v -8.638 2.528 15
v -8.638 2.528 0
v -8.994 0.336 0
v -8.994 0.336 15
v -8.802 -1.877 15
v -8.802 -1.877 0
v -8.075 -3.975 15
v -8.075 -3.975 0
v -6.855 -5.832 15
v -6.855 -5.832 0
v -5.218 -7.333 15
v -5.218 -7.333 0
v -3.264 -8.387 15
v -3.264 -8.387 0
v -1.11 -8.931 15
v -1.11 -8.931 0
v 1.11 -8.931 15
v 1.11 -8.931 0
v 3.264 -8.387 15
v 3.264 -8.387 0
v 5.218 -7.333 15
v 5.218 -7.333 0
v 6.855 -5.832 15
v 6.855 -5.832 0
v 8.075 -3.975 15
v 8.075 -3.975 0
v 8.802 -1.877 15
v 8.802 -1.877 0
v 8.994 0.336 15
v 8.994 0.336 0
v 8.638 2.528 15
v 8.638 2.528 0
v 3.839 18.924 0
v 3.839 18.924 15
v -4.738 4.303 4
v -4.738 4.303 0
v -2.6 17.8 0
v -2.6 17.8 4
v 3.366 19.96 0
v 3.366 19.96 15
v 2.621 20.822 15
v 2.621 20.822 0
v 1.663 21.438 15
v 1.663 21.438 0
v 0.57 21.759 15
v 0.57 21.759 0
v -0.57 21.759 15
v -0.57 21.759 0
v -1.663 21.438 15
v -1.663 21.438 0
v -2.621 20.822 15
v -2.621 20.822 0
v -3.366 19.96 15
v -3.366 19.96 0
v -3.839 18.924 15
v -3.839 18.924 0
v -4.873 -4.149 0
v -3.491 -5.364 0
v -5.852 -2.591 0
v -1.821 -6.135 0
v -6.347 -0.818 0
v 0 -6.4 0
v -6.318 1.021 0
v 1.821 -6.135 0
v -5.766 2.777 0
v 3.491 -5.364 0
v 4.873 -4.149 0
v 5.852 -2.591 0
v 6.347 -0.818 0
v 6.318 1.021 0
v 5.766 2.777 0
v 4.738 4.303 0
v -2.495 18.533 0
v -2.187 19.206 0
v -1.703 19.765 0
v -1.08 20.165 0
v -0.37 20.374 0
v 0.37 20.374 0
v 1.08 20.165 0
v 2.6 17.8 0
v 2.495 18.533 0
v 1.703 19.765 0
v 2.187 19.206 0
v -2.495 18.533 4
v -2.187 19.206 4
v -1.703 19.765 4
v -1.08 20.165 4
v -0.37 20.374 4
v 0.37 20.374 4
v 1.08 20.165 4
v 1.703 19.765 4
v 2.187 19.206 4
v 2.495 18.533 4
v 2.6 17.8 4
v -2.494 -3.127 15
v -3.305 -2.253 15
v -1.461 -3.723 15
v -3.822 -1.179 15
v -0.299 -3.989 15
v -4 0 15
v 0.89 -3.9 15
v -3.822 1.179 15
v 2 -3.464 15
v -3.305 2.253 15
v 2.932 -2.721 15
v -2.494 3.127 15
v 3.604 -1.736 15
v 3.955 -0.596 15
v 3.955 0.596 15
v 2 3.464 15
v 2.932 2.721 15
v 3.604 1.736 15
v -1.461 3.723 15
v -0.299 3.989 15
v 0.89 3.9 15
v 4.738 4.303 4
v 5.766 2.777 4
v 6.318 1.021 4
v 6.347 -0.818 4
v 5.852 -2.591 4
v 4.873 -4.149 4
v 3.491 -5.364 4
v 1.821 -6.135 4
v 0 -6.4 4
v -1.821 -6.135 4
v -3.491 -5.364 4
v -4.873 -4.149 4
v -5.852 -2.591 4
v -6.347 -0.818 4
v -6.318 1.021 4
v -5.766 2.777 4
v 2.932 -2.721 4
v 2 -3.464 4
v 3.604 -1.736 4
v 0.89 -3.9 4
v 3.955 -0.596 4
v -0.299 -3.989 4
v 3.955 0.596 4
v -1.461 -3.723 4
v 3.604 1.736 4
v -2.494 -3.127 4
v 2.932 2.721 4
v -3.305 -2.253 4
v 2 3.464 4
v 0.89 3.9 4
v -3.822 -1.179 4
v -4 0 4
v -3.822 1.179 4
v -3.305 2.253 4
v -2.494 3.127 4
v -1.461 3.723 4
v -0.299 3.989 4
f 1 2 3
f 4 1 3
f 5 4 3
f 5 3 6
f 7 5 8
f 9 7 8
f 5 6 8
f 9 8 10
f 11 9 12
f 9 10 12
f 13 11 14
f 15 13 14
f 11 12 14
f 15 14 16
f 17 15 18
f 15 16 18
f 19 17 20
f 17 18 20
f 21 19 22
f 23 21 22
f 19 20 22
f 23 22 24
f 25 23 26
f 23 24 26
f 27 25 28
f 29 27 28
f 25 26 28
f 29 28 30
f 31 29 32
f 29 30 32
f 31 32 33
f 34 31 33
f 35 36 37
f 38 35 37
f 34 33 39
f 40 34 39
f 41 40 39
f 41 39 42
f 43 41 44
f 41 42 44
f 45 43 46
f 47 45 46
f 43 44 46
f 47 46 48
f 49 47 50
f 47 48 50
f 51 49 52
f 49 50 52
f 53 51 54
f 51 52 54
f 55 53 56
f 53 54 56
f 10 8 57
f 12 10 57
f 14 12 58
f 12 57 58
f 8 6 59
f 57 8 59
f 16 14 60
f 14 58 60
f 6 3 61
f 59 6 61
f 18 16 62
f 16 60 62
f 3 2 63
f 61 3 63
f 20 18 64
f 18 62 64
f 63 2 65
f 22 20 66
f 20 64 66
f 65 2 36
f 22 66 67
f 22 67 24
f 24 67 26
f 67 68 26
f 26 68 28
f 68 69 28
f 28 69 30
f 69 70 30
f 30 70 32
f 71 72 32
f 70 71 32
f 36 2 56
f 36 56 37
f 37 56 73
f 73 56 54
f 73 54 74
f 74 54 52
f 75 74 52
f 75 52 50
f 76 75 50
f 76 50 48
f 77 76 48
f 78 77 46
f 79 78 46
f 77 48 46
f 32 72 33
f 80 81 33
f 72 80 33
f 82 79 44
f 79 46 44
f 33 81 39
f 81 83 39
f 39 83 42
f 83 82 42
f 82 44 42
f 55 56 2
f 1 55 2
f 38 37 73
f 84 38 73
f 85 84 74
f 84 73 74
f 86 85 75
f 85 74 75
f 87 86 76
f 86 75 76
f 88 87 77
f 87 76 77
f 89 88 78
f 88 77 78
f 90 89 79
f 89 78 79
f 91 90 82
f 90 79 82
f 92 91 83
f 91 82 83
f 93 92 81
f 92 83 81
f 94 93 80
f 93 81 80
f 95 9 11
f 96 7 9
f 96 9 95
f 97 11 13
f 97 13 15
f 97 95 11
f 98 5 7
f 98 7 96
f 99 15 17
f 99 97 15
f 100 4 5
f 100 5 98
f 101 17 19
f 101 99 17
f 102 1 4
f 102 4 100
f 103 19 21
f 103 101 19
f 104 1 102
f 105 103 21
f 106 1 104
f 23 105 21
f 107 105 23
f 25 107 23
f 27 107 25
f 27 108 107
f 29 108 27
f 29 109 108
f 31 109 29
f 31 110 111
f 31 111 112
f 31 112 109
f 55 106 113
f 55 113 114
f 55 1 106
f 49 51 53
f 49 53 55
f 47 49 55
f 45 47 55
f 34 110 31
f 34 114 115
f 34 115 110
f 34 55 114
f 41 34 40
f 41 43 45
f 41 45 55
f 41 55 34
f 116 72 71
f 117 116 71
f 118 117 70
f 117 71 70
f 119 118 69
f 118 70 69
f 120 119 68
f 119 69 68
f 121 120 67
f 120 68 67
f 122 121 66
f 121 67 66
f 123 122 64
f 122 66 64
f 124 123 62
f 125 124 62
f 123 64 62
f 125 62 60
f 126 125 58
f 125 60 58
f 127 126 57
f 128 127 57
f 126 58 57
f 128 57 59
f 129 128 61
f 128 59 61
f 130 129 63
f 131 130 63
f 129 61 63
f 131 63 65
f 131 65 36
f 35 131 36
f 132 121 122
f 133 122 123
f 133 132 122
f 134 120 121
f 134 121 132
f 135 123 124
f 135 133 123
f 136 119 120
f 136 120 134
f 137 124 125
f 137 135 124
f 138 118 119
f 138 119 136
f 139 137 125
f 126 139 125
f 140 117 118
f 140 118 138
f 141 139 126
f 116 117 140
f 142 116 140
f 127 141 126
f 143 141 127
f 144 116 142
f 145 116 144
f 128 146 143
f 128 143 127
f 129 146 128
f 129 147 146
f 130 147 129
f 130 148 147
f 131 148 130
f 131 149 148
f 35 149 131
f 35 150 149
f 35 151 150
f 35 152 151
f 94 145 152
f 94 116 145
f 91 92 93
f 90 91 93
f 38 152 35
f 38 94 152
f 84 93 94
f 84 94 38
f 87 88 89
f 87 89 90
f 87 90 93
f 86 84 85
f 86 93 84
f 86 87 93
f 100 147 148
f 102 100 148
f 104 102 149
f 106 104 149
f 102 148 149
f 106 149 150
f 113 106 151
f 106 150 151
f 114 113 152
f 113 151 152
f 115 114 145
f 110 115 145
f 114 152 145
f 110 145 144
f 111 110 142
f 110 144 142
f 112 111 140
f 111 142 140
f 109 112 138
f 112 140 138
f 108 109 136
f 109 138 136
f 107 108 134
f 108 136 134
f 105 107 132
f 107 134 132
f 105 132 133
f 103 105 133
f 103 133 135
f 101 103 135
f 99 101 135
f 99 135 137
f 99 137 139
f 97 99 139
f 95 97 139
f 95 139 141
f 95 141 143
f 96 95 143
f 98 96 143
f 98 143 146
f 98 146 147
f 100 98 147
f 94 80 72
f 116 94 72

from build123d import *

# Parameters (mm, degrees)
EXTRUDE_1_DEPTH     = 15
SKETCH_2_R          = 4
CUT_EXTRUDE_1_DEPTH = 4
SKETCH_2_3_R        = 4
CUT_EXTRUDE_2_DEPTH = 16


with BuildPart() as part:
    # Эскиз1 → Бобышка-Вытянуть1 (new body)
    with BuildSketch(Plane.XY):
        with BuildLine():
            Line((8.637636339, 2.528089888), (3.838949484, 18.923595506))
            ThreePointArc((3.838949484, 18.923595506), (0, 21.8), (-3.838949484, 18.923595506))
            Line((-3.838949484, 18.923595506), (-8.637636339, 2.528089888))
            ThreePointArc((-8.637636339, 2.528089888), (0, -9), (8.637636339, 2.528089888))
        make_face()
    extrude(amount=EXTRUDE_1_DEPTH)

    # Эскиз2 → Вырез-Вытянуть1 (cut)
    with BuildSketch(Plane(origin=(0, 0, 0), x_dir=(-1, 0, 0), z_dir=(0, 0, -1))):
        with BuildLine():
            Line((4.737753812, 4.302753632), (2.6, 17.8))
            ThreePointArc((2.6, 17.8), (0, 20.4), (-2.6, 17.8))
            Line((-2.6, 17.8), (-4.737753812, 4.302753632))
            ThreePointArc((-4.737753812, 4.302753632), (0, -6.4), (4.737753812, 4.302753632))
        make_face()
        Circle(SKETCH_2_R, mode=Mode.SUBTRACT)
    extrude(amount=-CUT_EXTRUDE_1_DEPTH, mode=Mode.SUBTRACT)

    # Эскиз2<3> → Вырез-Вытянуть2 (cut, through all)
    with BuildSketch(Plane(origin=(0, 0, 0), x_dir=(-1, 0, 0), z_dir=(0, 0, -1))):
        Circle(SKETCH_2_3_R)
    extrude(amount=-CUT_EXTRUDE_2_DEPTH, mode=Mode.SUBTRACT)


solid = part.part
